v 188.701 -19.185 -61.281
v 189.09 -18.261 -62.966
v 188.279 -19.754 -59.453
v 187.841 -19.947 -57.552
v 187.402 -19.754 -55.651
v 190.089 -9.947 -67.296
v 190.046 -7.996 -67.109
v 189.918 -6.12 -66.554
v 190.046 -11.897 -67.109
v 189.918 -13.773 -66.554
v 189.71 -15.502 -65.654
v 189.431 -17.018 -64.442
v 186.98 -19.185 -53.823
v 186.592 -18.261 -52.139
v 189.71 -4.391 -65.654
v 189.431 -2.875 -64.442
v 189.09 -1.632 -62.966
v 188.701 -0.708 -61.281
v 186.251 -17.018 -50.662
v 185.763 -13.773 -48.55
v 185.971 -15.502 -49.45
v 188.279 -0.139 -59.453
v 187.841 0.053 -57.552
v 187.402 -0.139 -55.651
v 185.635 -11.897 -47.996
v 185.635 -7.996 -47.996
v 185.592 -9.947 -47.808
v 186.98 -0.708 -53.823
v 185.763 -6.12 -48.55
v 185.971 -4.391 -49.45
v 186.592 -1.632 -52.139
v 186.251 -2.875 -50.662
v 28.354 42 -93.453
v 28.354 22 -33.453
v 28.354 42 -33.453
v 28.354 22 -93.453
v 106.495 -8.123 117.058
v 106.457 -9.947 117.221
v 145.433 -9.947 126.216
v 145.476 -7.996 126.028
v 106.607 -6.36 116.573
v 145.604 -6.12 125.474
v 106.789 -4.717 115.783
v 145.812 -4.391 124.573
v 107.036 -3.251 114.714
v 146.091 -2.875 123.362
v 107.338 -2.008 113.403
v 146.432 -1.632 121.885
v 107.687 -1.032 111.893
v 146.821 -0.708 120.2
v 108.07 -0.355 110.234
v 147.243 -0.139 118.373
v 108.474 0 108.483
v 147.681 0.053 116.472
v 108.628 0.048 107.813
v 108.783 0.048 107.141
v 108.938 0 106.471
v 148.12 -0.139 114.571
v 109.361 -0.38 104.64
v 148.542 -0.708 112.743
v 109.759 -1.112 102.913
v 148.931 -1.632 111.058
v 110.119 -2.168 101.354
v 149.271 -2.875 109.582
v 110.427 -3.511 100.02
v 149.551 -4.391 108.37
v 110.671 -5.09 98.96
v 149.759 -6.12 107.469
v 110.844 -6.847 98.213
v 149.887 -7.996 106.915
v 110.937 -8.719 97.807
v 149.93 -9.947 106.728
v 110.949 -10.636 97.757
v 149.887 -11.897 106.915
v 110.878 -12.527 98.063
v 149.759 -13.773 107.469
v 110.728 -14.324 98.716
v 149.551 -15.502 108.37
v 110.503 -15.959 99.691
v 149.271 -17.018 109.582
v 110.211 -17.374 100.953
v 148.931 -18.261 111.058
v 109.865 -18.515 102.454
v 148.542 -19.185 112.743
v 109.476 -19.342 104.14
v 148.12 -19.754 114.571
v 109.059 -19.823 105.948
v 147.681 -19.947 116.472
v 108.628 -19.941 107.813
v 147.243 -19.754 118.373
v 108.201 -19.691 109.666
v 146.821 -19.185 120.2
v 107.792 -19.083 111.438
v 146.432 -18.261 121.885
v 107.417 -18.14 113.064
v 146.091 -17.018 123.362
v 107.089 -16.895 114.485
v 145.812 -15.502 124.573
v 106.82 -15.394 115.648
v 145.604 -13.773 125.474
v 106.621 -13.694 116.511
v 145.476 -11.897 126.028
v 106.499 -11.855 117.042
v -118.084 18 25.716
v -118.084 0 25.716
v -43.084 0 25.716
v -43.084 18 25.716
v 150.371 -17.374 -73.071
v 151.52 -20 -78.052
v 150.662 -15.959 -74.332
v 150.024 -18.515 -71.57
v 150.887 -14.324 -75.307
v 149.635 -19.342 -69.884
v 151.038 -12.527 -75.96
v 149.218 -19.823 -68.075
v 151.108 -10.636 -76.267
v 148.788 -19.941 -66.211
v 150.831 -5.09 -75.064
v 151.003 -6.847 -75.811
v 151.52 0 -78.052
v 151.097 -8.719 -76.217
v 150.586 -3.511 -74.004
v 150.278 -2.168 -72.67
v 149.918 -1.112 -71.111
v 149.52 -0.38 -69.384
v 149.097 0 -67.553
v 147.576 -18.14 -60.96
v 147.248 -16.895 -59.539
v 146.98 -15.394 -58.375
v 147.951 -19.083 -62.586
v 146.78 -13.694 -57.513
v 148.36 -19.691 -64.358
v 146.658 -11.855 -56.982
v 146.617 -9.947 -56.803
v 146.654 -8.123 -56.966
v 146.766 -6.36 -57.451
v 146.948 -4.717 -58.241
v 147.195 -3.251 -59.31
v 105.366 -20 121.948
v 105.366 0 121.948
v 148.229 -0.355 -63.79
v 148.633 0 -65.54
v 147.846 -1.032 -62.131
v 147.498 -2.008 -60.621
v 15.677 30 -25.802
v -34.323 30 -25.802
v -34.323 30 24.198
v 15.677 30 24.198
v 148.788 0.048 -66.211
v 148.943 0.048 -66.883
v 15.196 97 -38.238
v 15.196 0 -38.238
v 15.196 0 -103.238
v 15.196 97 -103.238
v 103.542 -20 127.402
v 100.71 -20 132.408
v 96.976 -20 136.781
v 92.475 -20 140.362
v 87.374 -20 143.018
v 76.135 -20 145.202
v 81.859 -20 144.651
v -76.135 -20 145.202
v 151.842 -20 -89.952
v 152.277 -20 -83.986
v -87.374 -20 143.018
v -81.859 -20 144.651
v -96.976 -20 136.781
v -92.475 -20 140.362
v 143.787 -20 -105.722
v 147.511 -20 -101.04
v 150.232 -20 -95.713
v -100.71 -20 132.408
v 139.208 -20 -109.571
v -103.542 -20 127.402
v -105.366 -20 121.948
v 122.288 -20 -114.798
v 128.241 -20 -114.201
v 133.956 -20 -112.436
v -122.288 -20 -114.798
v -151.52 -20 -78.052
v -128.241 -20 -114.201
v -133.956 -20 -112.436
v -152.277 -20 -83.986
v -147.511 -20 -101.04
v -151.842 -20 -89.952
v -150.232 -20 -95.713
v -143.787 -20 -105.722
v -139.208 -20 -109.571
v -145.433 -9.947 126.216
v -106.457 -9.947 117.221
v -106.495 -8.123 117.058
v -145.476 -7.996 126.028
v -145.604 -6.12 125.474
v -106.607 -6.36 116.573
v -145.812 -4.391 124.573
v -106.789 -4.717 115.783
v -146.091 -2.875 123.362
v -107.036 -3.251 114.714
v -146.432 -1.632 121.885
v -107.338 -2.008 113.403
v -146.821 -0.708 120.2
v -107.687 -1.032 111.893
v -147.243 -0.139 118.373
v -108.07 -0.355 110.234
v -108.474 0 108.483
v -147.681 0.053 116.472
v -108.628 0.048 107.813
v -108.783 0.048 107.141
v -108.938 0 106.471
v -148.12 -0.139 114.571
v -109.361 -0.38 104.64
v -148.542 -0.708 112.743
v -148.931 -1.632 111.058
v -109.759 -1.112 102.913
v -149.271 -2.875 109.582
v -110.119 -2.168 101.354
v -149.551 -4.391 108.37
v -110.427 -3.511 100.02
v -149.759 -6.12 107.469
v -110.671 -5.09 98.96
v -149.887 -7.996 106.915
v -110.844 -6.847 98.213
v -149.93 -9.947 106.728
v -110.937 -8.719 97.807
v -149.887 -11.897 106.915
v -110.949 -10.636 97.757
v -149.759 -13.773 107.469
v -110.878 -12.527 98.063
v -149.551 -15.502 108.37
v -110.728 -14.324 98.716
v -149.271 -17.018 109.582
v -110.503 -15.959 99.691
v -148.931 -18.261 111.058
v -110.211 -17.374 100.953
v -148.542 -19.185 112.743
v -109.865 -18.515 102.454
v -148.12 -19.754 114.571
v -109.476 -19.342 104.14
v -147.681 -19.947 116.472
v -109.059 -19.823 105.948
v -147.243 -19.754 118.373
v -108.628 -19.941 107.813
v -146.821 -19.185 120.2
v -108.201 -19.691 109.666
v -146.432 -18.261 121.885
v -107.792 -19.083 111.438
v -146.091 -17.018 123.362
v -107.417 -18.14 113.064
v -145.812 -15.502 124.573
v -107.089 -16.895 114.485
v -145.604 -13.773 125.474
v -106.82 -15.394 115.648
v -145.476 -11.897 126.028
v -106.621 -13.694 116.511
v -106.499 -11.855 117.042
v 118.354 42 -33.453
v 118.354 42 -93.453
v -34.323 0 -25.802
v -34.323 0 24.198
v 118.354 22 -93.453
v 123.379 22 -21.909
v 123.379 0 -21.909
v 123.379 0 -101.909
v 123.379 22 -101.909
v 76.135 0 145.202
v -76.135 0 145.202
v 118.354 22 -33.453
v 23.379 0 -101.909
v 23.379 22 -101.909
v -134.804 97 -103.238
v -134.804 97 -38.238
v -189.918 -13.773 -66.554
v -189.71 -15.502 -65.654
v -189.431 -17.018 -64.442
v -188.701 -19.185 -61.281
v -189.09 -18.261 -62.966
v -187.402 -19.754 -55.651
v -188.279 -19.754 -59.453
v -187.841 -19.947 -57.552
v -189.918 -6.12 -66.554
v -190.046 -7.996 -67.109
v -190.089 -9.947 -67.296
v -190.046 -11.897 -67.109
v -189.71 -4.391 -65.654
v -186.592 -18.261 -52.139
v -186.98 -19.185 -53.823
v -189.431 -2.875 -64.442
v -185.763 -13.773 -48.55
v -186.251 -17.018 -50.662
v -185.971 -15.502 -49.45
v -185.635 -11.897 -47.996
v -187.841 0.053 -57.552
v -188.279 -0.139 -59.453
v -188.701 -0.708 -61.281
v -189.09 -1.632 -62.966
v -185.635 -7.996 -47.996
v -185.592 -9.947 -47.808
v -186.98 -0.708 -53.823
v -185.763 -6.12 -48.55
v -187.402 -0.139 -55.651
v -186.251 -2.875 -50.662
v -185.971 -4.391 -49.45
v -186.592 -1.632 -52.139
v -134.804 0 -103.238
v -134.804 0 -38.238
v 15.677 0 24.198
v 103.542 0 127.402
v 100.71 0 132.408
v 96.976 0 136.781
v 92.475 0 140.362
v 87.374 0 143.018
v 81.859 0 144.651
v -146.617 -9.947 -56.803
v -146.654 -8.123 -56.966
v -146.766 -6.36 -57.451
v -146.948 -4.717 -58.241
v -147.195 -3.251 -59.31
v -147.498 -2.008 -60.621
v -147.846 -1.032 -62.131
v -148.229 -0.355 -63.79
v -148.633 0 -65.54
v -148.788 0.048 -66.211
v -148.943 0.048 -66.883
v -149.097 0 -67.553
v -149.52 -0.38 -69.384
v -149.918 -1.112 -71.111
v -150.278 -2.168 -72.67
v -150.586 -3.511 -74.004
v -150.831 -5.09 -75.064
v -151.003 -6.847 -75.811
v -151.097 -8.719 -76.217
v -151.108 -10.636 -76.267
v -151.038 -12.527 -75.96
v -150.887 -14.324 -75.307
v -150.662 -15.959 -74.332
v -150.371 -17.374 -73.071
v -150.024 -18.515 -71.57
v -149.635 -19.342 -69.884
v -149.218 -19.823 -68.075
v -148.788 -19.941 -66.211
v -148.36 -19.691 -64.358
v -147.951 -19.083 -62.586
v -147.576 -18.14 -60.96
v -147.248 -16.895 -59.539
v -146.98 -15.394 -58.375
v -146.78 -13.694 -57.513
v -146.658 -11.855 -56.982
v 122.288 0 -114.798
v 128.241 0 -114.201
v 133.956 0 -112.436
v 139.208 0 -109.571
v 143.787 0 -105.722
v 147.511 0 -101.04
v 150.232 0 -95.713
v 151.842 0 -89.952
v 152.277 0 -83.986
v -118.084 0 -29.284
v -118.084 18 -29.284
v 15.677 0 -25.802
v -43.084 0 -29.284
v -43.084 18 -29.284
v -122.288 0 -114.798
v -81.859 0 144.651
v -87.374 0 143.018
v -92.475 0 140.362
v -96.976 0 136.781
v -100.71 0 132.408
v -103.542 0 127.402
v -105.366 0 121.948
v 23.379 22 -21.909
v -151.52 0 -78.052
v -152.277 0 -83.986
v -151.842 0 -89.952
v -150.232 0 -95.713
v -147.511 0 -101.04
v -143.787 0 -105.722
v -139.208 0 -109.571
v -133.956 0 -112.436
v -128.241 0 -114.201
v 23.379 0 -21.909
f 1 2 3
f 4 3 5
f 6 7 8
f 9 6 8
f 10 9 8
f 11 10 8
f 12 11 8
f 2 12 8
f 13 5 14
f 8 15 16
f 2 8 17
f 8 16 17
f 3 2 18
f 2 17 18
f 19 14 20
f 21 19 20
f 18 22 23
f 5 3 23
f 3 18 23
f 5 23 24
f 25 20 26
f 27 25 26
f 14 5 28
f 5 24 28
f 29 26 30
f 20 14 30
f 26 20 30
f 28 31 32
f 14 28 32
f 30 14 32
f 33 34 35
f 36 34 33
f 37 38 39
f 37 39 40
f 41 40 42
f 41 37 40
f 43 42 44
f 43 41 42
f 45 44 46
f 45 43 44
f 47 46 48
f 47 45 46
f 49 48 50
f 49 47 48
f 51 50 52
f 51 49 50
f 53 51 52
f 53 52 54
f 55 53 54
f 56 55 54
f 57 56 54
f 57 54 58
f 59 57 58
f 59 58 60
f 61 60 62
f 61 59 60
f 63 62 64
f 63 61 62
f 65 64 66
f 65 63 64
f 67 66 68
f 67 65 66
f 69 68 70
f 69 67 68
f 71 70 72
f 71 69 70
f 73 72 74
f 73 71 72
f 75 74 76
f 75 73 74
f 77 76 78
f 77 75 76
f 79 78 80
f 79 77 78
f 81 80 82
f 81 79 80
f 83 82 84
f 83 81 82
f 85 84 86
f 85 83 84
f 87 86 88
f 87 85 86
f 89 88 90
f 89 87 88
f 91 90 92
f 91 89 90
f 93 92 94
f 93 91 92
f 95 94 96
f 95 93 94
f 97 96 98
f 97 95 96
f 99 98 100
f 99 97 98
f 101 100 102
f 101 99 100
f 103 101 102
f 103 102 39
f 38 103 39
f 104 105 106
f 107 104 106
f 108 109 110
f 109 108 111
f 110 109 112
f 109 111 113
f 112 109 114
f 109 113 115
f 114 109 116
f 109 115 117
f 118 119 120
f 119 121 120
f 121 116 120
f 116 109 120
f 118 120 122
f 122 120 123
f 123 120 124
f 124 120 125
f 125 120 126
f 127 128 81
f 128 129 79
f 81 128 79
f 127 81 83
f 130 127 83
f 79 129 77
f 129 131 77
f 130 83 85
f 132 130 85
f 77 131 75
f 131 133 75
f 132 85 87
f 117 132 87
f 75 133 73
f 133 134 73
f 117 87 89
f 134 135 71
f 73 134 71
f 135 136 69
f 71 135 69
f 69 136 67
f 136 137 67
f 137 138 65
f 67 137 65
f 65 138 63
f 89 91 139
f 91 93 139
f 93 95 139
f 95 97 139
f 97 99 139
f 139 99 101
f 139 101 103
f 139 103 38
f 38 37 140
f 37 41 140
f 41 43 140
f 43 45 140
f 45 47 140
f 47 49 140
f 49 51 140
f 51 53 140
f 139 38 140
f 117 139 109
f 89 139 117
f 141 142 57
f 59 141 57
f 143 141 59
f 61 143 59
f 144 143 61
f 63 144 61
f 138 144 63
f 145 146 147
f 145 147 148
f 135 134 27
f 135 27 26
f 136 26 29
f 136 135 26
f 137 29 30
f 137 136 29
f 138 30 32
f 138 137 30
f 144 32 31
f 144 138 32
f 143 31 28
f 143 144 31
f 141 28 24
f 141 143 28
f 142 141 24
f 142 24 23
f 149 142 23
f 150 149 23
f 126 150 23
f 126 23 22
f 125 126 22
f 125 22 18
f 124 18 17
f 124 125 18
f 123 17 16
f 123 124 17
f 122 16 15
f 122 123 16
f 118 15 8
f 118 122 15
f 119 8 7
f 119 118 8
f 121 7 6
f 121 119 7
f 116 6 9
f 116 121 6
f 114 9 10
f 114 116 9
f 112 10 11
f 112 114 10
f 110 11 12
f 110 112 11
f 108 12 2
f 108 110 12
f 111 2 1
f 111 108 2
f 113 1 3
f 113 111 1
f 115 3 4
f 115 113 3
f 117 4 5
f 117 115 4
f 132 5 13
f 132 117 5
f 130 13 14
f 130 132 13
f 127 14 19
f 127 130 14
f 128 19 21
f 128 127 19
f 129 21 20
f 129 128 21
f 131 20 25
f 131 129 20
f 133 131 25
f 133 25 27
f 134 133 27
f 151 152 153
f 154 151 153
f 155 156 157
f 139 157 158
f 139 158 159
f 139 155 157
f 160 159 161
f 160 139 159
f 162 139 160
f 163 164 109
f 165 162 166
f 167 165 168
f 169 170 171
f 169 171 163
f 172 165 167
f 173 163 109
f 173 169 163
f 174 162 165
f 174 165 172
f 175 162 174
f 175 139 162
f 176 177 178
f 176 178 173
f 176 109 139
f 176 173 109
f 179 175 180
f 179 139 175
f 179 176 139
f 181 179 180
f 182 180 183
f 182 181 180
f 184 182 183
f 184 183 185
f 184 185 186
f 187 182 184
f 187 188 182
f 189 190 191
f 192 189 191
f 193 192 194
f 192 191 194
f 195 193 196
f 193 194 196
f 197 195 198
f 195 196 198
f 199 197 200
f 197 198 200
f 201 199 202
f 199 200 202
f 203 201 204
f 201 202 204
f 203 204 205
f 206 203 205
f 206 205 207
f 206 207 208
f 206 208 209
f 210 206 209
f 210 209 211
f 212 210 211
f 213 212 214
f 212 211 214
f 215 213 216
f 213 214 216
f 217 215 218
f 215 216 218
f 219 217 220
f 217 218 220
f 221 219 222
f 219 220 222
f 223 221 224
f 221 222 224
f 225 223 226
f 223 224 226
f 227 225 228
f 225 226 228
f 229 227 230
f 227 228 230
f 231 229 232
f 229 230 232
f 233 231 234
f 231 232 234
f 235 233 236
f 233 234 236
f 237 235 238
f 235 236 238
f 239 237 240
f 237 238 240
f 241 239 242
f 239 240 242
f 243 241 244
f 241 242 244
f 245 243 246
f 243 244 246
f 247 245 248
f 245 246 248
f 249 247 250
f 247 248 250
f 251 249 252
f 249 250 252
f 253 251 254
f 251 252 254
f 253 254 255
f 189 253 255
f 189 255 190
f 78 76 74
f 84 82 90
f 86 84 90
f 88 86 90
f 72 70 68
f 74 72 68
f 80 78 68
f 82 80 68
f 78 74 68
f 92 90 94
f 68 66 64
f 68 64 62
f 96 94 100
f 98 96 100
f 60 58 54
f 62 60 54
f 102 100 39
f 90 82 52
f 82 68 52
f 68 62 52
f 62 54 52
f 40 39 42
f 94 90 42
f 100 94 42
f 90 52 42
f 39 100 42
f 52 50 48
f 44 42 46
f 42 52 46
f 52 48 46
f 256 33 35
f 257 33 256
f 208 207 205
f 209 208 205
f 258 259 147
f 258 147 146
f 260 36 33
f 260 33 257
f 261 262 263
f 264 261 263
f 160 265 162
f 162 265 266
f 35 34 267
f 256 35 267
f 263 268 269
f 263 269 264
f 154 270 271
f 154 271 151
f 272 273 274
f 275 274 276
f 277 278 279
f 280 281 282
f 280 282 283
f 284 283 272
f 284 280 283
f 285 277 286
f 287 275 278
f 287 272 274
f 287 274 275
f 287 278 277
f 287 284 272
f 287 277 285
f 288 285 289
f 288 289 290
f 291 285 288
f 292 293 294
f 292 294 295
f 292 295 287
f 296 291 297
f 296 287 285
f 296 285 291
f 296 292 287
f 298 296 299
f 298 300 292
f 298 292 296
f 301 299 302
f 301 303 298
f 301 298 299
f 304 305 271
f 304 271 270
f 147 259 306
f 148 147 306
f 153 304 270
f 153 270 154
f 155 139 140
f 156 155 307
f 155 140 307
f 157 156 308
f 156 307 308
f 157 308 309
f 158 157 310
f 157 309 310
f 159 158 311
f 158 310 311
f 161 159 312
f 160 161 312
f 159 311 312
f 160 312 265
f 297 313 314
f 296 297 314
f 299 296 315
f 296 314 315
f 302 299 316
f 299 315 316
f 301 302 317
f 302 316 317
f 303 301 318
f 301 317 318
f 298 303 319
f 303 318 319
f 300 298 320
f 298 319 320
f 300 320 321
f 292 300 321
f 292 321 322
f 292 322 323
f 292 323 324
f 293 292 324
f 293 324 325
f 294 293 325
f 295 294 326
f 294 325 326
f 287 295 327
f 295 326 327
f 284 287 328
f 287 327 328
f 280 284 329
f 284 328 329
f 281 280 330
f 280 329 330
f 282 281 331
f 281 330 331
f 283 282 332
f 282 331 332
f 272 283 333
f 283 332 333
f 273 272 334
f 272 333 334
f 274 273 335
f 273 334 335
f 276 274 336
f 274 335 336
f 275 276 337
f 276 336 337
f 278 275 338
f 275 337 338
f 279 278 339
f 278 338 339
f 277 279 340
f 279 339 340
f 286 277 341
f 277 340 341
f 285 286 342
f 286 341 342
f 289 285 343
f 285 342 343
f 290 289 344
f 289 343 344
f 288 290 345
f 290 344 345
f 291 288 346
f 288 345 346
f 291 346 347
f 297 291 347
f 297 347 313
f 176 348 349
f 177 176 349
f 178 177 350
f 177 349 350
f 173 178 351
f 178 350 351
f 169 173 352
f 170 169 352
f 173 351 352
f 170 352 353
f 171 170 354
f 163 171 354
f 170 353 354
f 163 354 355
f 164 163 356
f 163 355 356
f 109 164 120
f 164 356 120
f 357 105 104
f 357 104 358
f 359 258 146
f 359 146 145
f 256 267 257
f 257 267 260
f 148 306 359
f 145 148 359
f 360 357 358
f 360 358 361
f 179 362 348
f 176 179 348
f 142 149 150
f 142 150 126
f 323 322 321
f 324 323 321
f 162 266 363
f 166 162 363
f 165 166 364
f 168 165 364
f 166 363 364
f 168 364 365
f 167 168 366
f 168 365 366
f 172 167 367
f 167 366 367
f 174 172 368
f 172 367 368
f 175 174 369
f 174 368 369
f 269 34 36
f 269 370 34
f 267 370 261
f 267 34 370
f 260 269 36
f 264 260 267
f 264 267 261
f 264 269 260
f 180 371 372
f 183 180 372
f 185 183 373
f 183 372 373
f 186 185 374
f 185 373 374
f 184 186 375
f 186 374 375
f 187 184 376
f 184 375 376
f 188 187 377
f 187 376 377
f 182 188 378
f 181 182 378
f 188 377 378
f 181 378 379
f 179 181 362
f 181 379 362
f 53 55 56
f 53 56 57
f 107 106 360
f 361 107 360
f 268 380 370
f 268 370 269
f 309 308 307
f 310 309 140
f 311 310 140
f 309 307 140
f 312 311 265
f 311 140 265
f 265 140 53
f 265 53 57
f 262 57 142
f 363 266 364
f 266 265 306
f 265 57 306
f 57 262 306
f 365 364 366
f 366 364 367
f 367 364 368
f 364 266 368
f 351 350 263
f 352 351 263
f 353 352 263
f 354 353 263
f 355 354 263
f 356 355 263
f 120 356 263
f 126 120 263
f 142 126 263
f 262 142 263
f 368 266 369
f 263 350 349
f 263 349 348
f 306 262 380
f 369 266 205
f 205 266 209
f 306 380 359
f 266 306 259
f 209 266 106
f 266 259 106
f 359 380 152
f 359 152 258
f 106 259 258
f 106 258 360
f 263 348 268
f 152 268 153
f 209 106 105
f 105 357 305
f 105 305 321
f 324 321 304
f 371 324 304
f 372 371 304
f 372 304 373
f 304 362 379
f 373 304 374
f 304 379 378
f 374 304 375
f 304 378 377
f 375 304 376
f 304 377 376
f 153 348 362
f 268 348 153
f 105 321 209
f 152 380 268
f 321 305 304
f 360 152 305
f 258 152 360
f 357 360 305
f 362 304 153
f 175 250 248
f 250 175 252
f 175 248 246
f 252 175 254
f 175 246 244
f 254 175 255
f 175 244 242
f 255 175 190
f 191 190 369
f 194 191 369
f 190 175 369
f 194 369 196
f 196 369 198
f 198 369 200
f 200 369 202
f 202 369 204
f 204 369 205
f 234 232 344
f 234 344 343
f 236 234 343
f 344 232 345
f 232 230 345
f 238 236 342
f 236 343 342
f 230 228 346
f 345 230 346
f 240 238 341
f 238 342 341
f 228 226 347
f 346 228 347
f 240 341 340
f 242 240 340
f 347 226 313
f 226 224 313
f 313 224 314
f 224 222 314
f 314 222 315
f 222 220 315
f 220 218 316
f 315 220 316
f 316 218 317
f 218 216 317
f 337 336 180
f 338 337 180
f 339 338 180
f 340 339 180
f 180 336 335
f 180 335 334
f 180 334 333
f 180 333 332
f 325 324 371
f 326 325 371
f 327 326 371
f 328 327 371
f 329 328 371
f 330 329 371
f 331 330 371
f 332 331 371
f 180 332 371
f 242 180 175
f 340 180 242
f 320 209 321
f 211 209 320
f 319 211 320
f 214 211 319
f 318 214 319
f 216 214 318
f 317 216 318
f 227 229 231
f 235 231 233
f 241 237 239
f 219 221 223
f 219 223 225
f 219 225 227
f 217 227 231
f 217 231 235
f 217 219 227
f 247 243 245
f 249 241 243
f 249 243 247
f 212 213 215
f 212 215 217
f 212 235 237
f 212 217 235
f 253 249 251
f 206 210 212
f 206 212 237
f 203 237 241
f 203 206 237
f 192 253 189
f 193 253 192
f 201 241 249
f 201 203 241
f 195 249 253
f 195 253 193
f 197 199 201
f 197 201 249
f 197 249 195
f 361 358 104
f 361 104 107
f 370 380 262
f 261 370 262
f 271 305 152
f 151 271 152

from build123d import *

# Parameters (mm, degrees)
BOSS_EXTRUDE1_DEPTH = 20
SKETCH2_W           = 150
SKETCH2_H           = 65
BOSS_EXTRUDE2_DEPTH = 97
SKETCH4_W           = 100
SKETCH4_H           = 80
BOSS_EXTRUDE3_DEPTH = 22
SKETCH5_W           = 90
SKETCH5_H           = 60
BOSS_EXTRUDE4_DEPTH = 20
SKETCH7_W           = 75
SKETCH7_H           = 55
BOSS_EXTRUDE5_DEPTH = 18
SKETCH9_W           = 50
SKETCH9_H           = 50
BOSS_EXTRUDE6_DEPTH = 30
SKETCH10_R          = 10
BOSS_EXTRUDE7_DEPTH = 40


with BuildPart() as part:
    # Sketch1 → Boss-Extrude1 (new body)
    with BuildSketch(Plane(origin=(0, 0, 0), x_dir=(1, 0, 0), z_dir=(0, 1, 0))):
        with BuildLine():
            Line((-122.288467544, 114.797617793), (122.288467544, 114.797617793))
            ThreePointArc((122.288467544, 114.797617793), (145.765834901, 103.474159817), (151.520203415, 78.051832592))
            Line((151.520203415, 78.051832592), (105.366357261, -121.948167408))
            ThreePointArc((105.366357261, -121.948167408), (94.811163415, -138.679749564), (76.13462139, -145.202382207))
            Line((76.13462139, -145.202382207), (-76.13462139, -145.202382207))
            ThreePointArc((-76.13462139, -145.202382207), (-94.811163415, -138.679749564), (-105.366357261, -121.948167408))
            Line((-105.366357261, -121.948167408), (-151.520203415, 78.051832592))
            ThreePointArc((-151.520203415, 78.051832592), (-145.765834901, 103.474159817), (-122.288467544, 114.797617793))
        make_face()
    extrude(amount=-BOSS_EXTRUDE1_DEPTH)

    # Sketch2 → Boss-Extrude2 (add)
    with BuildSketch(Plane(origin=(0, 0, 0), x_dir=(1, 0, 0), z_dir=(0, 1, 0))):
        with Locations((-59.803637432, 70.737817799)):
            Rectangle(SKETCH2_W, SKETCH2_H)
    extrude(amount=BOSS_EXTRUDE2_DEPTH)

    # Sketch4 → Boss-Extrude3 (add)
    with BuildSketch(Plane(origin=(0, 0, 0), x_dir=(1, 0, 0), z_dir=(0, 1, 0))):
        with Locations((73.379228632, 61.908908542)):
            Rectangle(SKETCH4_W, SKETCH4_H)
    extrude(amount=BOSS_EXTRUDE3_DEPTH)

    # Sketch5 → Boss-Extrude4 (add)
    with BuildSketch(Plane(origin=(0, 22, 0), x_dir=(1, 0, 0), z_dir=(0, 1, 0))):
        with Locations((73.353532596, 63.452591803)):
            Rectangle(SKETCH5_W, SKETCH5_H)
    extrude(amount=BOSS_EXTRUDE4_DEPTH)

    # Sketch7 → Boss-Extrude5 (add)
    with BuildSketch(Plane(origin=(0, 0, 0), x_dir=(1, 0, 0), z_dir=(0, 1, 0))):
        with Locations((-80.583724221, 1.784070664)):
            Rectangle(SKETCH7_W, SKETCH7_H)
    extrude(amount=BOSS_EXTRUDE5_DEPTH)

    # Sketch9 → Boss-Extrude6 (add)
    with BuildSketch(Plane(origin=(0, 0, 0), x_dir=(1, 0, 0), z_dir=(0, 1, 0))):
        with Locations((-9.322697354, 0.802057889)):
            Rectangle(SKETCH9_W, SKETCH9_H)
    extrude(amount=BOSS_EXTRUDE6_DEPTH)

    # Sketch10 → Boss-Extrude7 (add)
    with BuildSketch(Plane(origin=(-126.757825315, 0, 29.251805842), x_dir=(0.22485950669875854, 0, 0.97439119569462), z_dir=(-0.97439119569462, 0, 0.22485950669875854))):
        with Locations((80.281358312, -9.946535293)):
            Circle(SKETCH10_R)
        with Locations((-98.316139362, -9.946535293)):
            Circle(SKETCH10_R)
    boss_extrude7 = extrude(amount=BOSS_EXTRUDE7_DEPTH)

    # Mirror6: Boss-Extrude7 across plane
    add(boss_extrude7.mirror(Plane(origin=(0, 0, 0), x_dir=(0, 0, 1), z_dir=(1, 0, 0))))


solid = part.part
